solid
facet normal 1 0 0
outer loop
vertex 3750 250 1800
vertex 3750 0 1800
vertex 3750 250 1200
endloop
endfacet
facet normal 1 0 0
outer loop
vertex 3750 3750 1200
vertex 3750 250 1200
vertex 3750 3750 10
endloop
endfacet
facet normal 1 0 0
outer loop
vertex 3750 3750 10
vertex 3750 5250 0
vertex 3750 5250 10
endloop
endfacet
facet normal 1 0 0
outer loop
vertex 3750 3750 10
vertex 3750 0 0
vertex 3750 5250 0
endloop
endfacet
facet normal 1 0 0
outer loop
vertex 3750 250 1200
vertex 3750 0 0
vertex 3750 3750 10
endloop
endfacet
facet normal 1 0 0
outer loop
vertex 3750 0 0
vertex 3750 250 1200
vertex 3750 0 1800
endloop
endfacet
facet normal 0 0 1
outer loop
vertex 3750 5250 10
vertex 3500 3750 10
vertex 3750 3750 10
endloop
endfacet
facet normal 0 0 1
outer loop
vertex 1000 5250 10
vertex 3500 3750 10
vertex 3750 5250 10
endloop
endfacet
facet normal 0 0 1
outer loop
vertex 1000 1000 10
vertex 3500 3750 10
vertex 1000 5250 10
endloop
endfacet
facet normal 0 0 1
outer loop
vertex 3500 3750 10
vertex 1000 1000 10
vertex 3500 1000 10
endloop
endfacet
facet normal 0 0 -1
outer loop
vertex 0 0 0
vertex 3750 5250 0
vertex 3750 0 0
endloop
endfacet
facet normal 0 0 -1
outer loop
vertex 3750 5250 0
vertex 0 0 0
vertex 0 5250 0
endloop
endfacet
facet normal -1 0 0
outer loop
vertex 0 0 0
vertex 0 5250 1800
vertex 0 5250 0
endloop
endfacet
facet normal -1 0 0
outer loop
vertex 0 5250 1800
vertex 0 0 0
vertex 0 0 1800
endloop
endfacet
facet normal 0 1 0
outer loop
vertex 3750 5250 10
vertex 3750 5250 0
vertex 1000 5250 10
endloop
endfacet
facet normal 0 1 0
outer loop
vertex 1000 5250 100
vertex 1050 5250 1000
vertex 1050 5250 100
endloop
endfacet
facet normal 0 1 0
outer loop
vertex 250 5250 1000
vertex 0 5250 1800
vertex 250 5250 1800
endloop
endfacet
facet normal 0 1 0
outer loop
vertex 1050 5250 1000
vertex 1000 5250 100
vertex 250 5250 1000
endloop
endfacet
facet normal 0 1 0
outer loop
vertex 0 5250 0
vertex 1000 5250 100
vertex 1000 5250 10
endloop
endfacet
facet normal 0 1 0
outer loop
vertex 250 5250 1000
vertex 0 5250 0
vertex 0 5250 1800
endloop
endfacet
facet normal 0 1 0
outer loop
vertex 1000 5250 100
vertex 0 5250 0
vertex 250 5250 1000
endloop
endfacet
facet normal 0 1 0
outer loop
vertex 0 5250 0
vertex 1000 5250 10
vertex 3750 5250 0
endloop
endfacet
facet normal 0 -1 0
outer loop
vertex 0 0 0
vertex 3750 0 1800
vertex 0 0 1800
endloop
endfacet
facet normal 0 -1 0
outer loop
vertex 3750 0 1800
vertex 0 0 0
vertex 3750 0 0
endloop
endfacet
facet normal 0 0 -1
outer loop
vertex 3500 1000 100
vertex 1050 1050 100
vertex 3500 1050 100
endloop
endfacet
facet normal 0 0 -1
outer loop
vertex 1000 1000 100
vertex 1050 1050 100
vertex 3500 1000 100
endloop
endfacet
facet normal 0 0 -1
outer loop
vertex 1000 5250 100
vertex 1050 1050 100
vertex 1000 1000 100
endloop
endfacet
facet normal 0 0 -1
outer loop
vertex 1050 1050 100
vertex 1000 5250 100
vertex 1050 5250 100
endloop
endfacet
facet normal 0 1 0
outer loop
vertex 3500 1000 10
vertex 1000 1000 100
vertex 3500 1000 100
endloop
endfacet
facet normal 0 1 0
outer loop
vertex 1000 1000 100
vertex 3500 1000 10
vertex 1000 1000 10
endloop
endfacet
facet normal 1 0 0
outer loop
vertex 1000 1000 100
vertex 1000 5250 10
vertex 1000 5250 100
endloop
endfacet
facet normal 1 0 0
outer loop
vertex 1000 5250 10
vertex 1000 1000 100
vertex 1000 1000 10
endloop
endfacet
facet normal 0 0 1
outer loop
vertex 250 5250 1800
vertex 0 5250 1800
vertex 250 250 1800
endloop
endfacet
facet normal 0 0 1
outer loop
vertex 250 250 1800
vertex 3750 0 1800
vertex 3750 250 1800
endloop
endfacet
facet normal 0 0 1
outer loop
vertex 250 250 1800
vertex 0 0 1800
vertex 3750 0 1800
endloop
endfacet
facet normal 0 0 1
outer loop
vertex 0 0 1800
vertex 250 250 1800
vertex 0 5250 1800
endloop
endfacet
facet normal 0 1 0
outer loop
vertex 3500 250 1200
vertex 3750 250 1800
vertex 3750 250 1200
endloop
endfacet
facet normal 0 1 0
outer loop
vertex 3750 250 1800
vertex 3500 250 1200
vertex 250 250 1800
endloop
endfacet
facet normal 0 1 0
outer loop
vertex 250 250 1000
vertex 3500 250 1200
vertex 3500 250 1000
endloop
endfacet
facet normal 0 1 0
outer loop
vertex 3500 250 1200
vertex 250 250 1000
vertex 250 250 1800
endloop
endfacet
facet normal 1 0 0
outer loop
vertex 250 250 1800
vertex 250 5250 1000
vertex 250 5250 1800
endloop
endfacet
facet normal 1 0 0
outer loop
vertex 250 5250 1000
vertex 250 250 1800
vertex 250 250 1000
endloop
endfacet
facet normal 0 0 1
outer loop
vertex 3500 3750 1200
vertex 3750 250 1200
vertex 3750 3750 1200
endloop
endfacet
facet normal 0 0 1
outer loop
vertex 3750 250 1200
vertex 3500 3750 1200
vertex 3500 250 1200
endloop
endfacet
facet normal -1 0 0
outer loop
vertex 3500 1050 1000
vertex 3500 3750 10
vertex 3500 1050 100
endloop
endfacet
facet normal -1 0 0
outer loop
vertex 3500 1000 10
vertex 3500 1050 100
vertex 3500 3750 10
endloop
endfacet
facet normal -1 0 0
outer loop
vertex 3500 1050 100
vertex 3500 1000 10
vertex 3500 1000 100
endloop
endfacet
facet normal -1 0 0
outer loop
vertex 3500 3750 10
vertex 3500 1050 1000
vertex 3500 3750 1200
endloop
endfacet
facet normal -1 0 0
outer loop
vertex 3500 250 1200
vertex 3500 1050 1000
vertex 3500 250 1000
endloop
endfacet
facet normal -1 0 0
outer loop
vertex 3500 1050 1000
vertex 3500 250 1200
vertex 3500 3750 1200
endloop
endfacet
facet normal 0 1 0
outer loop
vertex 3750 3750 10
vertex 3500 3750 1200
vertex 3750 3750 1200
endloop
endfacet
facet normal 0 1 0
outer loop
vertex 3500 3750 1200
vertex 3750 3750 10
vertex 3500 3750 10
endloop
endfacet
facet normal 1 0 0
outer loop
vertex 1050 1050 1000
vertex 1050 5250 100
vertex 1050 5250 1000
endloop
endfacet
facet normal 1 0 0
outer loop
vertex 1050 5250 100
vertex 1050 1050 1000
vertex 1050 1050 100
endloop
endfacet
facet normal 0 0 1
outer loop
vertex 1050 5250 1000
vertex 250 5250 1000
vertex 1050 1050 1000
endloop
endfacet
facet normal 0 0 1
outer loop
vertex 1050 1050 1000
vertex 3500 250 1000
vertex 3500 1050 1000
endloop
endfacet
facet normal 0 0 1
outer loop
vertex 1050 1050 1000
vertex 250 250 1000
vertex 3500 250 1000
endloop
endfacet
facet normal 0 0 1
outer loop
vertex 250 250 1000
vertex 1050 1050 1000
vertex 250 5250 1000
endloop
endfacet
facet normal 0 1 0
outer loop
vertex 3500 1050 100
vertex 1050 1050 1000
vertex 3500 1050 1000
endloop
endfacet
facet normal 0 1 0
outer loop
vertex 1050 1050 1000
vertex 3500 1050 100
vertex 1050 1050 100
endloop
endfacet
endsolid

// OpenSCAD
// file: ../library/modules.scad
module box(width, length, height, wallThickness, open = "top") {    
    // inner core in the center, equals to open == "none"
    innerHeight = open == "bottom" ? height+1 : (open == "top" ? height+1 : height);
    innerZ = open == "bottom" ? -wallThickness : (open == "top" ? wallThickness : 0);


    innerWidth = open == "left" ? width+1 : (open == "right" ? width+1 : width);
    innerX = open == "left" ? -wallThickness : (open == "right" ? wallThickness : 0);

    innerLength = open == "front" ? length+1 : (open == "back" ? length+1 : length);
    innerY = open == "front" ? -wallThickness : (open == "back" ? wallThickness : 0);


    translate([0, 0, height / 2 + wallThickness])
    difference() {
        cube(size = [length + 2 * wallThickness, width + 2 * wallThickness, height + 2 * wallThickness], center = true);
        translate([innerX, innerY, innerZ])
            cube(size = [innerLength, innerWidth, innerHeight], center = true);
    }
}

module prism(l, w, h) {
       polyhedron(points=[
               [0,0,h],           // 0    front top corner
               [0,0,0],[w,0,0],   // 1, 2 front left & right bottom corners
               [0,l,h],           // 3    back top corner
               [0,l,0],[w,l,0]    // 4, 5 back left & right bottom corners
       ], faces=[ // points for all faces must be ordered clockwise when looking in
               [0,2,1],    // top face
               [3,4,5],    // base face
               [0,1,4,3],  // h face
               [1,2,5,4],  // w face
               [0,3,5,2],  // hypotenuse face
       ]);
}

module boardMitreJoints(length, width, thickness) {
    // lower board with mitre joint
    cube(size = [length, width, thickness]);
    //difference() {
    //    cube(size = [length, width, thickness]);
    //    translate([0, 0, thickness]) rotate([0,90,0]) prism(width+100, thickness, thickness);
    //    translate([length, 0, thickness]) rotate([0,-180,0]) prism(width+100, thickness, thickness);
    //};
}
// main file
include <../library/modules.scad>

// Fläche
cube(size = [3750, 5250, 10]);

// Fundament
cube(size = [3750, 1000, 100]);
cube(size = [1000, 5250, 100]);

cube(size = [3750, 250, 1800]);
cube(size = [250, 5250, 1800]);

translate([3500, 0, 0])
cube(size = [250, 3750, 1200]);

translate([250, 0, 100])
cube(size = [800, 5250, 900]);

translate([0, 250, 100])
cube(size = [3750, 800, 900]);
